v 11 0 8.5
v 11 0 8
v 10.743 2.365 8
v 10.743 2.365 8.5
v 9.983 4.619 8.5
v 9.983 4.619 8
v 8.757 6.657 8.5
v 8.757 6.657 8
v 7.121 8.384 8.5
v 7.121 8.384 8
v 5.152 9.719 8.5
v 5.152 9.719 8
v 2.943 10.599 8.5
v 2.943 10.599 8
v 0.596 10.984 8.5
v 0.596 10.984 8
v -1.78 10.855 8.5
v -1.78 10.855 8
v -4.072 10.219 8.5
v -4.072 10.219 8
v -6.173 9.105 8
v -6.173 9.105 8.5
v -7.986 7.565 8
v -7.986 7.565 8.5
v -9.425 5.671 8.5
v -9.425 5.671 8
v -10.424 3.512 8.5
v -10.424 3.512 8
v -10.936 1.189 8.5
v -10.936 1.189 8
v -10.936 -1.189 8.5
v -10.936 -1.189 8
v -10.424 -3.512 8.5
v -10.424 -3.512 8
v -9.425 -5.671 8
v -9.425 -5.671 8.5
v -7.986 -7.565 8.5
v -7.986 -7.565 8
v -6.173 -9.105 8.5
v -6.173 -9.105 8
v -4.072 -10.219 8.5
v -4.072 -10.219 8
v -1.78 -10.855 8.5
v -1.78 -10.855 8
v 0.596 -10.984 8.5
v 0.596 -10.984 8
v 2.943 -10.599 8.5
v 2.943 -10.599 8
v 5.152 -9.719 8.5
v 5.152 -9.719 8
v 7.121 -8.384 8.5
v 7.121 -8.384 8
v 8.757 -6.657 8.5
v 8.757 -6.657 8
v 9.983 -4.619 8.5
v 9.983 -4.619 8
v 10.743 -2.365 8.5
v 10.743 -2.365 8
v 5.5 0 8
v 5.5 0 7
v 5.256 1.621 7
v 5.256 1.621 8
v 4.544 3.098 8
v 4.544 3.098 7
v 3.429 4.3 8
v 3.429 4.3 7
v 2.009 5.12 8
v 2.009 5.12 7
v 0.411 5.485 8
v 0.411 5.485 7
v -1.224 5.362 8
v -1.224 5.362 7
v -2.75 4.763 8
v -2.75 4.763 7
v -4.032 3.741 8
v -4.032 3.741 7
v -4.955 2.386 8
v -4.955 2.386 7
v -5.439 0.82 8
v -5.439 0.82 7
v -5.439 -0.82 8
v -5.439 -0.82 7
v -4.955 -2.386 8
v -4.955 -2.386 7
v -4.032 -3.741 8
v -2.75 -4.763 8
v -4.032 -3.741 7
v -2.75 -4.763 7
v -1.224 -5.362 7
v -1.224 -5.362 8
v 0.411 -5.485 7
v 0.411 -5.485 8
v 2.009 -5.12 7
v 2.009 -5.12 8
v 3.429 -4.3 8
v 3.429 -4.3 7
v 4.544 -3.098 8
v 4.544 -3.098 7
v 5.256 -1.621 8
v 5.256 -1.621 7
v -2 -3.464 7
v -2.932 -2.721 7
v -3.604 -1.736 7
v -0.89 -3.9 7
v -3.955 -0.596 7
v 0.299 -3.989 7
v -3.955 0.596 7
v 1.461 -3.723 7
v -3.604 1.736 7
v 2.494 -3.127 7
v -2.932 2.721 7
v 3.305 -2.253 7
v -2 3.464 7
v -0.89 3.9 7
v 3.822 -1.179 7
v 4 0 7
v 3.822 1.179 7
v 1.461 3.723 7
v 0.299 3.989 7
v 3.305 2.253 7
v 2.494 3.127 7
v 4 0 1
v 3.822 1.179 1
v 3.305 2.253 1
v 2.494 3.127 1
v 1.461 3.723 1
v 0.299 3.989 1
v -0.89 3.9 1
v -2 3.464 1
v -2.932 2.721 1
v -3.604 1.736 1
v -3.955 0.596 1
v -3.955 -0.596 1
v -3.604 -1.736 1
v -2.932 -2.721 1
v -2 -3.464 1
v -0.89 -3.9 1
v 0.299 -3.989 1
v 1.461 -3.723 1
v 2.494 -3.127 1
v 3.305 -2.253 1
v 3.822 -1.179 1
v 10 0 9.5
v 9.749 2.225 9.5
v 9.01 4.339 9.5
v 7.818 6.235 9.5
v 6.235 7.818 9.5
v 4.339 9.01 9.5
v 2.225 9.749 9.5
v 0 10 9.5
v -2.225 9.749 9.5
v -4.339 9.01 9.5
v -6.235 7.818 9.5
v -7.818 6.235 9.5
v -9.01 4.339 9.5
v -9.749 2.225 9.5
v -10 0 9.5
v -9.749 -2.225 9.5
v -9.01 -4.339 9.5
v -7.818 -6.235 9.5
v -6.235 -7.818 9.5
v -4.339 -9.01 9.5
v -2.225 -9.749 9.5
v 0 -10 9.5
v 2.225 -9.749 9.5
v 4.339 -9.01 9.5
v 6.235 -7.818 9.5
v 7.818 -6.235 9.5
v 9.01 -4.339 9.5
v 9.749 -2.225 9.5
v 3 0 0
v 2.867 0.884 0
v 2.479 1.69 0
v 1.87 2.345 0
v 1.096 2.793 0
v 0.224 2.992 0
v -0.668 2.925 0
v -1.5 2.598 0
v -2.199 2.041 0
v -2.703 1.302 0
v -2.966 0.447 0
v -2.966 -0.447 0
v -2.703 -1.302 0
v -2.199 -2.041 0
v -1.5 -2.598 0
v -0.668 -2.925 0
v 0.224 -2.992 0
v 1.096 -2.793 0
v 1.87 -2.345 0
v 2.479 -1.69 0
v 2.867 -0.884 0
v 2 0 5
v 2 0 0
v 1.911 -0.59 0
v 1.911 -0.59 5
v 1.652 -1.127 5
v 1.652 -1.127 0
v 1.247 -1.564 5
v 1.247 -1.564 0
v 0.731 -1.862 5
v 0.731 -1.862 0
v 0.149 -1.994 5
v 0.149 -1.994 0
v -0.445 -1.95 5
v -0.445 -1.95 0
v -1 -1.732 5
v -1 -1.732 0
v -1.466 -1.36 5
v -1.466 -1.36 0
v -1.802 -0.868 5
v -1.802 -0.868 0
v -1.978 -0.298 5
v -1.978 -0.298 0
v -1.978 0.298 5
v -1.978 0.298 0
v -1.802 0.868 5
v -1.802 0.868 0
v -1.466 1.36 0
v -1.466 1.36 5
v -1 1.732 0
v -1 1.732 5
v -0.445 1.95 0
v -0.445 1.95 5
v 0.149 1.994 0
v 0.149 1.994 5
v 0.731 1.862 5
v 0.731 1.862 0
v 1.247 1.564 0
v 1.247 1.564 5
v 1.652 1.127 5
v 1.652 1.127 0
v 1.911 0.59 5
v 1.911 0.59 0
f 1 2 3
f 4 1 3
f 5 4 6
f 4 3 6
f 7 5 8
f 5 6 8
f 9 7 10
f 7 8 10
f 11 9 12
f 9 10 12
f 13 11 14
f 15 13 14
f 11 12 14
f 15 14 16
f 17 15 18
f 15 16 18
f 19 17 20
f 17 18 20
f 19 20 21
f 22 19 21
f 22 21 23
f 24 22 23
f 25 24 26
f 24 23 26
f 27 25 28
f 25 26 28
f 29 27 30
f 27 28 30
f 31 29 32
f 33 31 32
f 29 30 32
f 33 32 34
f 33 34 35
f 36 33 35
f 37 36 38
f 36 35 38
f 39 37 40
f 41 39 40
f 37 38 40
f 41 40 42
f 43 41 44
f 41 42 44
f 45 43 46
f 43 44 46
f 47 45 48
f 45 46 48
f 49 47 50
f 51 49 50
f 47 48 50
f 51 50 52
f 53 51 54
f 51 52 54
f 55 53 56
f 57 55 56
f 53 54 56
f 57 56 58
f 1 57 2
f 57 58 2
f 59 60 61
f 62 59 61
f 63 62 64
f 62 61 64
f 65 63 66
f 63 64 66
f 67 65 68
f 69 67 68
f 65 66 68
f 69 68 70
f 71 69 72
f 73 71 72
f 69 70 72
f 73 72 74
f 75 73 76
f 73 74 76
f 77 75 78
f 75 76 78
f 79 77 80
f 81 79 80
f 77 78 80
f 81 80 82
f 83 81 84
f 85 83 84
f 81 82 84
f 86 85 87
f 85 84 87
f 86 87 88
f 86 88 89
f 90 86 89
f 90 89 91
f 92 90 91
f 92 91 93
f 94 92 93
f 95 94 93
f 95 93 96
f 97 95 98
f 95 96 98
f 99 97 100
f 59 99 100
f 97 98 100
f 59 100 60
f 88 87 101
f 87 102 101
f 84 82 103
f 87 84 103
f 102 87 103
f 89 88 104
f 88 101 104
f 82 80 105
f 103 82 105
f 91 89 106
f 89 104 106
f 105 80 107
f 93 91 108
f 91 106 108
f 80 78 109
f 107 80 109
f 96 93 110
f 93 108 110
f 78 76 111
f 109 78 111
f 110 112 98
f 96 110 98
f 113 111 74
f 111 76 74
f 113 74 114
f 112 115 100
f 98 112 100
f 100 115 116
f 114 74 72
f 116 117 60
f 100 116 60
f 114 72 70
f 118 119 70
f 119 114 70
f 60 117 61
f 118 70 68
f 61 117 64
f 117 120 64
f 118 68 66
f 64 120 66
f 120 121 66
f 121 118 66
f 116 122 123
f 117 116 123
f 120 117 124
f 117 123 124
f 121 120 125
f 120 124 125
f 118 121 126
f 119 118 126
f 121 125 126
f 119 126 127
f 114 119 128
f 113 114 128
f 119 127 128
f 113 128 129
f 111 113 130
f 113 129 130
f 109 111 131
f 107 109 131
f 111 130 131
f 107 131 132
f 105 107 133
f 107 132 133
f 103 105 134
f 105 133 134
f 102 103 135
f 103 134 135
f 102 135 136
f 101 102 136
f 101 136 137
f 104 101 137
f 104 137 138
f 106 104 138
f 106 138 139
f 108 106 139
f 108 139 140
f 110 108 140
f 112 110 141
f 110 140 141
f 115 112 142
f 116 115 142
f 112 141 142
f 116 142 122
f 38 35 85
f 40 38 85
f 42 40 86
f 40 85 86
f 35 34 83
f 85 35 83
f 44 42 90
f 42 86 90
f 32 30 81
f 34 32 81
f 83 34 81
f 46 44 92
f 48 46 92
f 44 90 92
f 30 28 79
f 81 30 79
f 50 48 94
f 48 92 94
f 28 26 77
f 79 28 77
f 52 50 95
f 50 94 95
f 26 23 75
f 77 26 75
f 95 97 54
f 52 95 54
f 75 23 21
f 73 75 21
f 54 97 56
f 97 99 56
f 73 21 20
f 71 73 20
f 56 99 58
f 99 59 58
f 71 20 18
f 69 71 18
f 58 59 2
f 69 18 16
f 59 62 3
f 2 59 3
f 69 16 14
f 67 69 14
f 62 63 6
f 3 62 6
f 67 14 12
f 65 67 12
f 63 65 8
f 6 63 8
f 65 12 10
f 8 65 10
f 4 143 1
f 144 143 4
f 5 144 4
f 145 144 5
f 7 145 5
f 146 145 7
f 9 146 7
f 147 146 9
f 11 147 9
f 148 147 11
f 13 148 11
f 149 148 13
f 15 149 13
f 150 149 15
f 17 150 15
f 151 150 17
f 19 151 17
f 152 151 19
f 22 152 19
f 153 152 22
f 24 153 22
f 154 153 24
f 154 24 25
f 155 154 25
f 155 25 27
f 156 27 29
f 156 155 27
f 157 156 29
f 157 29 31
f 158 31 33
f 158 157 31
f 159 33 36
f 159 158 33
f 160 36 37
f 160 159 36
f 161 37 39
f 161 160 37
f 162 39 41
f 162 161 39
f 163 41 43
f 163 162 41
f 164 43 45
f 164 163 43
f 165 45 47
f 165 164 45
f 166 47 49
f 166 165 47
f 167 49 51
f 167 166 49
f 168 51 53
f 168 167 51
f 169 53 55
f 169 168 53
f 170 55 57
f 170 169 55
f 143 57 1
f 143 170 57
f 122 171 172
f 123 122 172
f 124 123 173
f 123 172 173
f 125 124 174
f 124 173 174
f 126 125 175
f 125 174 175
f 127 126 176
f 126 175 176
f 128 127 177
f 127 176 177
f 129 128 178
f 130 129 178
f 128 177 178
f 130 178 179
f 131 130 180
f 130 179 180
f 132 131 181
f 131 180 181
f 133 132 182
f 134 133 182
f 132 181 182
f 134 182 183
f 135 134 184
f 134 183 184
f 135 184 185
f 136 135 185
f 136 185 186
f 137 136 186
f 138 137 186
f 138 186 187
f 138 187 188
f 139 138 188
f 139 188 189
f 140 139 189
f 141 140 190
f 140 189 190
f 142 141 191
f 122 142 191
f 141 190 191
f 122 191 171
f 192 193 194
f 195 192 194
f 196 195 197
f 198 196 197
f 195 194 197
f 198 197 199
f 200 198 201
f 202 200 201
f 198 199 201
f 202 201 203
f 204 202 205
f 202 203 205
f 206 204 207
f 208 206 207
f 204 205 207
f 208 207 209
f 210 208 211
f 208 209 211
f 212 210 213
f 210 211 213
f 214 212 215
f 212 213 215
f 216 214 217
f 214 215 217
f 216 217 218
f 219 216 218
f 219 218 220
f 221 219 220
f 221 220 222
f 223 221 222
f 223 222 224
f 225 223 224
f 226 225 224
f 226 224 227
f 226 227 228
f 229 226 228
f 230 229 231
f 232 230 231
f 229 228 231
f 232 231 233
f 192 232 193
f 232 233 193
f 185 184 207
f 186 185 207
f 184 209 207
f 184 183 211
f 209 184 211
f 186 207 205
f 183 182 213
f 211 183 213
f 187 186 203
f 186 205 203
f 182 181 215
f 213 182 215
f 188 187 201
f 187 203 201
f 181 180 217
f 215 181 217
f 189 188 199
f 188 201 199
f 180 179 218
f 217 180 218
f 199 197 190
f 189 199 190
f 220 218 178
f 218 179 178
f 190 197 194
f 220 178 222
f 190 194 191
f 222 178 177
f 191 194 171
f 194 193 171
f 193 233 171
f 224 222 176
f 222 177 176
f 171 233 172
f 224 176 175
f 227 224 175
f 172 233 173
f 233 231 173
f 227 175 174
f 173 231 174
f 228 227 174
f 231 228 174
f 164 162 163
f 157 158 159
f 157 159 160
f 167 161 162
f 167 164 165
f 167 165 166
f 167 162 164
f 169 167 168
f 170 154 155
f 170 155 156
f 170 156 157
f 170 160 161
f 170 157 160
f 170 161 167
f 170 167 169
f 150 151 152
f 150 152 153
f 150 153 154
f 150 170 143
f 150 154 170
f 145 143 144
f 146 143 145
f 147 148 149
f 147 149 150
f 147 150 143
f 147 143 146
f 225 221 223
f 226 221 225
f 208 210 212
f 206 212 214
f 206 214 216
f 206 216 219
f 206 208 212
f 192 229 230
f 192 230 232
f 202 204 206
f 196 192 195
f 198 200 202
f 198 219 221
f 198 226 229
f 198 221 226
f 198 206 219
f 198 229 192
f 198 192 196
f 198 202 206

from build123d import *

# Parameters (mm, degrees)
F0_R     = 4
F1_DEPTH = 7
F2_R     = 5.5
F2_R_2   = 4
F3_DEPTH = 1
F4_R     = 11
F5_DEPTH = 1.5
F6_R     = 2
F7_DEPTH = 5
F8_SIZE  = 1
F9_SIZE  = 1


with BuildPart() as f1:
    # F0 (on Top) → F1 (new body)
    with BuildSketch(Plane.XY):
        Circle(F0_R)
    extrude(amount=F1_DEPTH)

    # F2 (on face) → F3 (join)
    with BuildSketch(Plane.XY.offset(7)):
        Circle(F2_R)
        Circle(F2_R_2, mode=Mode.SUBTRACT)
        Circle(F2_R_2)
    extrude(amount=F3_DEPTH)

    # F4 (on face) → F5 (join)
    with BuildSketch(Plane.XY.offset(8)):
        Circle(F4_R)
    extrude(amount=F5_DEPTH)

    # F6 (on face) → F7 (cut)
    with BuildSketch(Plane(origin=(0, 0, 0), x_dir=(1, 0, 0), z_dir=(0, 0, -1))):
        Circle(F6_R)
    extrude(amount=-F7_DEPTH, mode=Mode.SUBTRACT)

    # F8
    f8_edges = [f1.edges().sort_by_distance(p)[0] for p in [
        (-4, 0, 0),
    ]]
    chamfer(f8_edges, length=F8_SIZE)

    # F9
    f9_edges = [f1.edges().sort_by_distance(p)[0] for p in [
        (-11, 0, 9.5),
    ]]
    chamfer(f9_edges, length=F9_SIZE)


solid = f1.part
